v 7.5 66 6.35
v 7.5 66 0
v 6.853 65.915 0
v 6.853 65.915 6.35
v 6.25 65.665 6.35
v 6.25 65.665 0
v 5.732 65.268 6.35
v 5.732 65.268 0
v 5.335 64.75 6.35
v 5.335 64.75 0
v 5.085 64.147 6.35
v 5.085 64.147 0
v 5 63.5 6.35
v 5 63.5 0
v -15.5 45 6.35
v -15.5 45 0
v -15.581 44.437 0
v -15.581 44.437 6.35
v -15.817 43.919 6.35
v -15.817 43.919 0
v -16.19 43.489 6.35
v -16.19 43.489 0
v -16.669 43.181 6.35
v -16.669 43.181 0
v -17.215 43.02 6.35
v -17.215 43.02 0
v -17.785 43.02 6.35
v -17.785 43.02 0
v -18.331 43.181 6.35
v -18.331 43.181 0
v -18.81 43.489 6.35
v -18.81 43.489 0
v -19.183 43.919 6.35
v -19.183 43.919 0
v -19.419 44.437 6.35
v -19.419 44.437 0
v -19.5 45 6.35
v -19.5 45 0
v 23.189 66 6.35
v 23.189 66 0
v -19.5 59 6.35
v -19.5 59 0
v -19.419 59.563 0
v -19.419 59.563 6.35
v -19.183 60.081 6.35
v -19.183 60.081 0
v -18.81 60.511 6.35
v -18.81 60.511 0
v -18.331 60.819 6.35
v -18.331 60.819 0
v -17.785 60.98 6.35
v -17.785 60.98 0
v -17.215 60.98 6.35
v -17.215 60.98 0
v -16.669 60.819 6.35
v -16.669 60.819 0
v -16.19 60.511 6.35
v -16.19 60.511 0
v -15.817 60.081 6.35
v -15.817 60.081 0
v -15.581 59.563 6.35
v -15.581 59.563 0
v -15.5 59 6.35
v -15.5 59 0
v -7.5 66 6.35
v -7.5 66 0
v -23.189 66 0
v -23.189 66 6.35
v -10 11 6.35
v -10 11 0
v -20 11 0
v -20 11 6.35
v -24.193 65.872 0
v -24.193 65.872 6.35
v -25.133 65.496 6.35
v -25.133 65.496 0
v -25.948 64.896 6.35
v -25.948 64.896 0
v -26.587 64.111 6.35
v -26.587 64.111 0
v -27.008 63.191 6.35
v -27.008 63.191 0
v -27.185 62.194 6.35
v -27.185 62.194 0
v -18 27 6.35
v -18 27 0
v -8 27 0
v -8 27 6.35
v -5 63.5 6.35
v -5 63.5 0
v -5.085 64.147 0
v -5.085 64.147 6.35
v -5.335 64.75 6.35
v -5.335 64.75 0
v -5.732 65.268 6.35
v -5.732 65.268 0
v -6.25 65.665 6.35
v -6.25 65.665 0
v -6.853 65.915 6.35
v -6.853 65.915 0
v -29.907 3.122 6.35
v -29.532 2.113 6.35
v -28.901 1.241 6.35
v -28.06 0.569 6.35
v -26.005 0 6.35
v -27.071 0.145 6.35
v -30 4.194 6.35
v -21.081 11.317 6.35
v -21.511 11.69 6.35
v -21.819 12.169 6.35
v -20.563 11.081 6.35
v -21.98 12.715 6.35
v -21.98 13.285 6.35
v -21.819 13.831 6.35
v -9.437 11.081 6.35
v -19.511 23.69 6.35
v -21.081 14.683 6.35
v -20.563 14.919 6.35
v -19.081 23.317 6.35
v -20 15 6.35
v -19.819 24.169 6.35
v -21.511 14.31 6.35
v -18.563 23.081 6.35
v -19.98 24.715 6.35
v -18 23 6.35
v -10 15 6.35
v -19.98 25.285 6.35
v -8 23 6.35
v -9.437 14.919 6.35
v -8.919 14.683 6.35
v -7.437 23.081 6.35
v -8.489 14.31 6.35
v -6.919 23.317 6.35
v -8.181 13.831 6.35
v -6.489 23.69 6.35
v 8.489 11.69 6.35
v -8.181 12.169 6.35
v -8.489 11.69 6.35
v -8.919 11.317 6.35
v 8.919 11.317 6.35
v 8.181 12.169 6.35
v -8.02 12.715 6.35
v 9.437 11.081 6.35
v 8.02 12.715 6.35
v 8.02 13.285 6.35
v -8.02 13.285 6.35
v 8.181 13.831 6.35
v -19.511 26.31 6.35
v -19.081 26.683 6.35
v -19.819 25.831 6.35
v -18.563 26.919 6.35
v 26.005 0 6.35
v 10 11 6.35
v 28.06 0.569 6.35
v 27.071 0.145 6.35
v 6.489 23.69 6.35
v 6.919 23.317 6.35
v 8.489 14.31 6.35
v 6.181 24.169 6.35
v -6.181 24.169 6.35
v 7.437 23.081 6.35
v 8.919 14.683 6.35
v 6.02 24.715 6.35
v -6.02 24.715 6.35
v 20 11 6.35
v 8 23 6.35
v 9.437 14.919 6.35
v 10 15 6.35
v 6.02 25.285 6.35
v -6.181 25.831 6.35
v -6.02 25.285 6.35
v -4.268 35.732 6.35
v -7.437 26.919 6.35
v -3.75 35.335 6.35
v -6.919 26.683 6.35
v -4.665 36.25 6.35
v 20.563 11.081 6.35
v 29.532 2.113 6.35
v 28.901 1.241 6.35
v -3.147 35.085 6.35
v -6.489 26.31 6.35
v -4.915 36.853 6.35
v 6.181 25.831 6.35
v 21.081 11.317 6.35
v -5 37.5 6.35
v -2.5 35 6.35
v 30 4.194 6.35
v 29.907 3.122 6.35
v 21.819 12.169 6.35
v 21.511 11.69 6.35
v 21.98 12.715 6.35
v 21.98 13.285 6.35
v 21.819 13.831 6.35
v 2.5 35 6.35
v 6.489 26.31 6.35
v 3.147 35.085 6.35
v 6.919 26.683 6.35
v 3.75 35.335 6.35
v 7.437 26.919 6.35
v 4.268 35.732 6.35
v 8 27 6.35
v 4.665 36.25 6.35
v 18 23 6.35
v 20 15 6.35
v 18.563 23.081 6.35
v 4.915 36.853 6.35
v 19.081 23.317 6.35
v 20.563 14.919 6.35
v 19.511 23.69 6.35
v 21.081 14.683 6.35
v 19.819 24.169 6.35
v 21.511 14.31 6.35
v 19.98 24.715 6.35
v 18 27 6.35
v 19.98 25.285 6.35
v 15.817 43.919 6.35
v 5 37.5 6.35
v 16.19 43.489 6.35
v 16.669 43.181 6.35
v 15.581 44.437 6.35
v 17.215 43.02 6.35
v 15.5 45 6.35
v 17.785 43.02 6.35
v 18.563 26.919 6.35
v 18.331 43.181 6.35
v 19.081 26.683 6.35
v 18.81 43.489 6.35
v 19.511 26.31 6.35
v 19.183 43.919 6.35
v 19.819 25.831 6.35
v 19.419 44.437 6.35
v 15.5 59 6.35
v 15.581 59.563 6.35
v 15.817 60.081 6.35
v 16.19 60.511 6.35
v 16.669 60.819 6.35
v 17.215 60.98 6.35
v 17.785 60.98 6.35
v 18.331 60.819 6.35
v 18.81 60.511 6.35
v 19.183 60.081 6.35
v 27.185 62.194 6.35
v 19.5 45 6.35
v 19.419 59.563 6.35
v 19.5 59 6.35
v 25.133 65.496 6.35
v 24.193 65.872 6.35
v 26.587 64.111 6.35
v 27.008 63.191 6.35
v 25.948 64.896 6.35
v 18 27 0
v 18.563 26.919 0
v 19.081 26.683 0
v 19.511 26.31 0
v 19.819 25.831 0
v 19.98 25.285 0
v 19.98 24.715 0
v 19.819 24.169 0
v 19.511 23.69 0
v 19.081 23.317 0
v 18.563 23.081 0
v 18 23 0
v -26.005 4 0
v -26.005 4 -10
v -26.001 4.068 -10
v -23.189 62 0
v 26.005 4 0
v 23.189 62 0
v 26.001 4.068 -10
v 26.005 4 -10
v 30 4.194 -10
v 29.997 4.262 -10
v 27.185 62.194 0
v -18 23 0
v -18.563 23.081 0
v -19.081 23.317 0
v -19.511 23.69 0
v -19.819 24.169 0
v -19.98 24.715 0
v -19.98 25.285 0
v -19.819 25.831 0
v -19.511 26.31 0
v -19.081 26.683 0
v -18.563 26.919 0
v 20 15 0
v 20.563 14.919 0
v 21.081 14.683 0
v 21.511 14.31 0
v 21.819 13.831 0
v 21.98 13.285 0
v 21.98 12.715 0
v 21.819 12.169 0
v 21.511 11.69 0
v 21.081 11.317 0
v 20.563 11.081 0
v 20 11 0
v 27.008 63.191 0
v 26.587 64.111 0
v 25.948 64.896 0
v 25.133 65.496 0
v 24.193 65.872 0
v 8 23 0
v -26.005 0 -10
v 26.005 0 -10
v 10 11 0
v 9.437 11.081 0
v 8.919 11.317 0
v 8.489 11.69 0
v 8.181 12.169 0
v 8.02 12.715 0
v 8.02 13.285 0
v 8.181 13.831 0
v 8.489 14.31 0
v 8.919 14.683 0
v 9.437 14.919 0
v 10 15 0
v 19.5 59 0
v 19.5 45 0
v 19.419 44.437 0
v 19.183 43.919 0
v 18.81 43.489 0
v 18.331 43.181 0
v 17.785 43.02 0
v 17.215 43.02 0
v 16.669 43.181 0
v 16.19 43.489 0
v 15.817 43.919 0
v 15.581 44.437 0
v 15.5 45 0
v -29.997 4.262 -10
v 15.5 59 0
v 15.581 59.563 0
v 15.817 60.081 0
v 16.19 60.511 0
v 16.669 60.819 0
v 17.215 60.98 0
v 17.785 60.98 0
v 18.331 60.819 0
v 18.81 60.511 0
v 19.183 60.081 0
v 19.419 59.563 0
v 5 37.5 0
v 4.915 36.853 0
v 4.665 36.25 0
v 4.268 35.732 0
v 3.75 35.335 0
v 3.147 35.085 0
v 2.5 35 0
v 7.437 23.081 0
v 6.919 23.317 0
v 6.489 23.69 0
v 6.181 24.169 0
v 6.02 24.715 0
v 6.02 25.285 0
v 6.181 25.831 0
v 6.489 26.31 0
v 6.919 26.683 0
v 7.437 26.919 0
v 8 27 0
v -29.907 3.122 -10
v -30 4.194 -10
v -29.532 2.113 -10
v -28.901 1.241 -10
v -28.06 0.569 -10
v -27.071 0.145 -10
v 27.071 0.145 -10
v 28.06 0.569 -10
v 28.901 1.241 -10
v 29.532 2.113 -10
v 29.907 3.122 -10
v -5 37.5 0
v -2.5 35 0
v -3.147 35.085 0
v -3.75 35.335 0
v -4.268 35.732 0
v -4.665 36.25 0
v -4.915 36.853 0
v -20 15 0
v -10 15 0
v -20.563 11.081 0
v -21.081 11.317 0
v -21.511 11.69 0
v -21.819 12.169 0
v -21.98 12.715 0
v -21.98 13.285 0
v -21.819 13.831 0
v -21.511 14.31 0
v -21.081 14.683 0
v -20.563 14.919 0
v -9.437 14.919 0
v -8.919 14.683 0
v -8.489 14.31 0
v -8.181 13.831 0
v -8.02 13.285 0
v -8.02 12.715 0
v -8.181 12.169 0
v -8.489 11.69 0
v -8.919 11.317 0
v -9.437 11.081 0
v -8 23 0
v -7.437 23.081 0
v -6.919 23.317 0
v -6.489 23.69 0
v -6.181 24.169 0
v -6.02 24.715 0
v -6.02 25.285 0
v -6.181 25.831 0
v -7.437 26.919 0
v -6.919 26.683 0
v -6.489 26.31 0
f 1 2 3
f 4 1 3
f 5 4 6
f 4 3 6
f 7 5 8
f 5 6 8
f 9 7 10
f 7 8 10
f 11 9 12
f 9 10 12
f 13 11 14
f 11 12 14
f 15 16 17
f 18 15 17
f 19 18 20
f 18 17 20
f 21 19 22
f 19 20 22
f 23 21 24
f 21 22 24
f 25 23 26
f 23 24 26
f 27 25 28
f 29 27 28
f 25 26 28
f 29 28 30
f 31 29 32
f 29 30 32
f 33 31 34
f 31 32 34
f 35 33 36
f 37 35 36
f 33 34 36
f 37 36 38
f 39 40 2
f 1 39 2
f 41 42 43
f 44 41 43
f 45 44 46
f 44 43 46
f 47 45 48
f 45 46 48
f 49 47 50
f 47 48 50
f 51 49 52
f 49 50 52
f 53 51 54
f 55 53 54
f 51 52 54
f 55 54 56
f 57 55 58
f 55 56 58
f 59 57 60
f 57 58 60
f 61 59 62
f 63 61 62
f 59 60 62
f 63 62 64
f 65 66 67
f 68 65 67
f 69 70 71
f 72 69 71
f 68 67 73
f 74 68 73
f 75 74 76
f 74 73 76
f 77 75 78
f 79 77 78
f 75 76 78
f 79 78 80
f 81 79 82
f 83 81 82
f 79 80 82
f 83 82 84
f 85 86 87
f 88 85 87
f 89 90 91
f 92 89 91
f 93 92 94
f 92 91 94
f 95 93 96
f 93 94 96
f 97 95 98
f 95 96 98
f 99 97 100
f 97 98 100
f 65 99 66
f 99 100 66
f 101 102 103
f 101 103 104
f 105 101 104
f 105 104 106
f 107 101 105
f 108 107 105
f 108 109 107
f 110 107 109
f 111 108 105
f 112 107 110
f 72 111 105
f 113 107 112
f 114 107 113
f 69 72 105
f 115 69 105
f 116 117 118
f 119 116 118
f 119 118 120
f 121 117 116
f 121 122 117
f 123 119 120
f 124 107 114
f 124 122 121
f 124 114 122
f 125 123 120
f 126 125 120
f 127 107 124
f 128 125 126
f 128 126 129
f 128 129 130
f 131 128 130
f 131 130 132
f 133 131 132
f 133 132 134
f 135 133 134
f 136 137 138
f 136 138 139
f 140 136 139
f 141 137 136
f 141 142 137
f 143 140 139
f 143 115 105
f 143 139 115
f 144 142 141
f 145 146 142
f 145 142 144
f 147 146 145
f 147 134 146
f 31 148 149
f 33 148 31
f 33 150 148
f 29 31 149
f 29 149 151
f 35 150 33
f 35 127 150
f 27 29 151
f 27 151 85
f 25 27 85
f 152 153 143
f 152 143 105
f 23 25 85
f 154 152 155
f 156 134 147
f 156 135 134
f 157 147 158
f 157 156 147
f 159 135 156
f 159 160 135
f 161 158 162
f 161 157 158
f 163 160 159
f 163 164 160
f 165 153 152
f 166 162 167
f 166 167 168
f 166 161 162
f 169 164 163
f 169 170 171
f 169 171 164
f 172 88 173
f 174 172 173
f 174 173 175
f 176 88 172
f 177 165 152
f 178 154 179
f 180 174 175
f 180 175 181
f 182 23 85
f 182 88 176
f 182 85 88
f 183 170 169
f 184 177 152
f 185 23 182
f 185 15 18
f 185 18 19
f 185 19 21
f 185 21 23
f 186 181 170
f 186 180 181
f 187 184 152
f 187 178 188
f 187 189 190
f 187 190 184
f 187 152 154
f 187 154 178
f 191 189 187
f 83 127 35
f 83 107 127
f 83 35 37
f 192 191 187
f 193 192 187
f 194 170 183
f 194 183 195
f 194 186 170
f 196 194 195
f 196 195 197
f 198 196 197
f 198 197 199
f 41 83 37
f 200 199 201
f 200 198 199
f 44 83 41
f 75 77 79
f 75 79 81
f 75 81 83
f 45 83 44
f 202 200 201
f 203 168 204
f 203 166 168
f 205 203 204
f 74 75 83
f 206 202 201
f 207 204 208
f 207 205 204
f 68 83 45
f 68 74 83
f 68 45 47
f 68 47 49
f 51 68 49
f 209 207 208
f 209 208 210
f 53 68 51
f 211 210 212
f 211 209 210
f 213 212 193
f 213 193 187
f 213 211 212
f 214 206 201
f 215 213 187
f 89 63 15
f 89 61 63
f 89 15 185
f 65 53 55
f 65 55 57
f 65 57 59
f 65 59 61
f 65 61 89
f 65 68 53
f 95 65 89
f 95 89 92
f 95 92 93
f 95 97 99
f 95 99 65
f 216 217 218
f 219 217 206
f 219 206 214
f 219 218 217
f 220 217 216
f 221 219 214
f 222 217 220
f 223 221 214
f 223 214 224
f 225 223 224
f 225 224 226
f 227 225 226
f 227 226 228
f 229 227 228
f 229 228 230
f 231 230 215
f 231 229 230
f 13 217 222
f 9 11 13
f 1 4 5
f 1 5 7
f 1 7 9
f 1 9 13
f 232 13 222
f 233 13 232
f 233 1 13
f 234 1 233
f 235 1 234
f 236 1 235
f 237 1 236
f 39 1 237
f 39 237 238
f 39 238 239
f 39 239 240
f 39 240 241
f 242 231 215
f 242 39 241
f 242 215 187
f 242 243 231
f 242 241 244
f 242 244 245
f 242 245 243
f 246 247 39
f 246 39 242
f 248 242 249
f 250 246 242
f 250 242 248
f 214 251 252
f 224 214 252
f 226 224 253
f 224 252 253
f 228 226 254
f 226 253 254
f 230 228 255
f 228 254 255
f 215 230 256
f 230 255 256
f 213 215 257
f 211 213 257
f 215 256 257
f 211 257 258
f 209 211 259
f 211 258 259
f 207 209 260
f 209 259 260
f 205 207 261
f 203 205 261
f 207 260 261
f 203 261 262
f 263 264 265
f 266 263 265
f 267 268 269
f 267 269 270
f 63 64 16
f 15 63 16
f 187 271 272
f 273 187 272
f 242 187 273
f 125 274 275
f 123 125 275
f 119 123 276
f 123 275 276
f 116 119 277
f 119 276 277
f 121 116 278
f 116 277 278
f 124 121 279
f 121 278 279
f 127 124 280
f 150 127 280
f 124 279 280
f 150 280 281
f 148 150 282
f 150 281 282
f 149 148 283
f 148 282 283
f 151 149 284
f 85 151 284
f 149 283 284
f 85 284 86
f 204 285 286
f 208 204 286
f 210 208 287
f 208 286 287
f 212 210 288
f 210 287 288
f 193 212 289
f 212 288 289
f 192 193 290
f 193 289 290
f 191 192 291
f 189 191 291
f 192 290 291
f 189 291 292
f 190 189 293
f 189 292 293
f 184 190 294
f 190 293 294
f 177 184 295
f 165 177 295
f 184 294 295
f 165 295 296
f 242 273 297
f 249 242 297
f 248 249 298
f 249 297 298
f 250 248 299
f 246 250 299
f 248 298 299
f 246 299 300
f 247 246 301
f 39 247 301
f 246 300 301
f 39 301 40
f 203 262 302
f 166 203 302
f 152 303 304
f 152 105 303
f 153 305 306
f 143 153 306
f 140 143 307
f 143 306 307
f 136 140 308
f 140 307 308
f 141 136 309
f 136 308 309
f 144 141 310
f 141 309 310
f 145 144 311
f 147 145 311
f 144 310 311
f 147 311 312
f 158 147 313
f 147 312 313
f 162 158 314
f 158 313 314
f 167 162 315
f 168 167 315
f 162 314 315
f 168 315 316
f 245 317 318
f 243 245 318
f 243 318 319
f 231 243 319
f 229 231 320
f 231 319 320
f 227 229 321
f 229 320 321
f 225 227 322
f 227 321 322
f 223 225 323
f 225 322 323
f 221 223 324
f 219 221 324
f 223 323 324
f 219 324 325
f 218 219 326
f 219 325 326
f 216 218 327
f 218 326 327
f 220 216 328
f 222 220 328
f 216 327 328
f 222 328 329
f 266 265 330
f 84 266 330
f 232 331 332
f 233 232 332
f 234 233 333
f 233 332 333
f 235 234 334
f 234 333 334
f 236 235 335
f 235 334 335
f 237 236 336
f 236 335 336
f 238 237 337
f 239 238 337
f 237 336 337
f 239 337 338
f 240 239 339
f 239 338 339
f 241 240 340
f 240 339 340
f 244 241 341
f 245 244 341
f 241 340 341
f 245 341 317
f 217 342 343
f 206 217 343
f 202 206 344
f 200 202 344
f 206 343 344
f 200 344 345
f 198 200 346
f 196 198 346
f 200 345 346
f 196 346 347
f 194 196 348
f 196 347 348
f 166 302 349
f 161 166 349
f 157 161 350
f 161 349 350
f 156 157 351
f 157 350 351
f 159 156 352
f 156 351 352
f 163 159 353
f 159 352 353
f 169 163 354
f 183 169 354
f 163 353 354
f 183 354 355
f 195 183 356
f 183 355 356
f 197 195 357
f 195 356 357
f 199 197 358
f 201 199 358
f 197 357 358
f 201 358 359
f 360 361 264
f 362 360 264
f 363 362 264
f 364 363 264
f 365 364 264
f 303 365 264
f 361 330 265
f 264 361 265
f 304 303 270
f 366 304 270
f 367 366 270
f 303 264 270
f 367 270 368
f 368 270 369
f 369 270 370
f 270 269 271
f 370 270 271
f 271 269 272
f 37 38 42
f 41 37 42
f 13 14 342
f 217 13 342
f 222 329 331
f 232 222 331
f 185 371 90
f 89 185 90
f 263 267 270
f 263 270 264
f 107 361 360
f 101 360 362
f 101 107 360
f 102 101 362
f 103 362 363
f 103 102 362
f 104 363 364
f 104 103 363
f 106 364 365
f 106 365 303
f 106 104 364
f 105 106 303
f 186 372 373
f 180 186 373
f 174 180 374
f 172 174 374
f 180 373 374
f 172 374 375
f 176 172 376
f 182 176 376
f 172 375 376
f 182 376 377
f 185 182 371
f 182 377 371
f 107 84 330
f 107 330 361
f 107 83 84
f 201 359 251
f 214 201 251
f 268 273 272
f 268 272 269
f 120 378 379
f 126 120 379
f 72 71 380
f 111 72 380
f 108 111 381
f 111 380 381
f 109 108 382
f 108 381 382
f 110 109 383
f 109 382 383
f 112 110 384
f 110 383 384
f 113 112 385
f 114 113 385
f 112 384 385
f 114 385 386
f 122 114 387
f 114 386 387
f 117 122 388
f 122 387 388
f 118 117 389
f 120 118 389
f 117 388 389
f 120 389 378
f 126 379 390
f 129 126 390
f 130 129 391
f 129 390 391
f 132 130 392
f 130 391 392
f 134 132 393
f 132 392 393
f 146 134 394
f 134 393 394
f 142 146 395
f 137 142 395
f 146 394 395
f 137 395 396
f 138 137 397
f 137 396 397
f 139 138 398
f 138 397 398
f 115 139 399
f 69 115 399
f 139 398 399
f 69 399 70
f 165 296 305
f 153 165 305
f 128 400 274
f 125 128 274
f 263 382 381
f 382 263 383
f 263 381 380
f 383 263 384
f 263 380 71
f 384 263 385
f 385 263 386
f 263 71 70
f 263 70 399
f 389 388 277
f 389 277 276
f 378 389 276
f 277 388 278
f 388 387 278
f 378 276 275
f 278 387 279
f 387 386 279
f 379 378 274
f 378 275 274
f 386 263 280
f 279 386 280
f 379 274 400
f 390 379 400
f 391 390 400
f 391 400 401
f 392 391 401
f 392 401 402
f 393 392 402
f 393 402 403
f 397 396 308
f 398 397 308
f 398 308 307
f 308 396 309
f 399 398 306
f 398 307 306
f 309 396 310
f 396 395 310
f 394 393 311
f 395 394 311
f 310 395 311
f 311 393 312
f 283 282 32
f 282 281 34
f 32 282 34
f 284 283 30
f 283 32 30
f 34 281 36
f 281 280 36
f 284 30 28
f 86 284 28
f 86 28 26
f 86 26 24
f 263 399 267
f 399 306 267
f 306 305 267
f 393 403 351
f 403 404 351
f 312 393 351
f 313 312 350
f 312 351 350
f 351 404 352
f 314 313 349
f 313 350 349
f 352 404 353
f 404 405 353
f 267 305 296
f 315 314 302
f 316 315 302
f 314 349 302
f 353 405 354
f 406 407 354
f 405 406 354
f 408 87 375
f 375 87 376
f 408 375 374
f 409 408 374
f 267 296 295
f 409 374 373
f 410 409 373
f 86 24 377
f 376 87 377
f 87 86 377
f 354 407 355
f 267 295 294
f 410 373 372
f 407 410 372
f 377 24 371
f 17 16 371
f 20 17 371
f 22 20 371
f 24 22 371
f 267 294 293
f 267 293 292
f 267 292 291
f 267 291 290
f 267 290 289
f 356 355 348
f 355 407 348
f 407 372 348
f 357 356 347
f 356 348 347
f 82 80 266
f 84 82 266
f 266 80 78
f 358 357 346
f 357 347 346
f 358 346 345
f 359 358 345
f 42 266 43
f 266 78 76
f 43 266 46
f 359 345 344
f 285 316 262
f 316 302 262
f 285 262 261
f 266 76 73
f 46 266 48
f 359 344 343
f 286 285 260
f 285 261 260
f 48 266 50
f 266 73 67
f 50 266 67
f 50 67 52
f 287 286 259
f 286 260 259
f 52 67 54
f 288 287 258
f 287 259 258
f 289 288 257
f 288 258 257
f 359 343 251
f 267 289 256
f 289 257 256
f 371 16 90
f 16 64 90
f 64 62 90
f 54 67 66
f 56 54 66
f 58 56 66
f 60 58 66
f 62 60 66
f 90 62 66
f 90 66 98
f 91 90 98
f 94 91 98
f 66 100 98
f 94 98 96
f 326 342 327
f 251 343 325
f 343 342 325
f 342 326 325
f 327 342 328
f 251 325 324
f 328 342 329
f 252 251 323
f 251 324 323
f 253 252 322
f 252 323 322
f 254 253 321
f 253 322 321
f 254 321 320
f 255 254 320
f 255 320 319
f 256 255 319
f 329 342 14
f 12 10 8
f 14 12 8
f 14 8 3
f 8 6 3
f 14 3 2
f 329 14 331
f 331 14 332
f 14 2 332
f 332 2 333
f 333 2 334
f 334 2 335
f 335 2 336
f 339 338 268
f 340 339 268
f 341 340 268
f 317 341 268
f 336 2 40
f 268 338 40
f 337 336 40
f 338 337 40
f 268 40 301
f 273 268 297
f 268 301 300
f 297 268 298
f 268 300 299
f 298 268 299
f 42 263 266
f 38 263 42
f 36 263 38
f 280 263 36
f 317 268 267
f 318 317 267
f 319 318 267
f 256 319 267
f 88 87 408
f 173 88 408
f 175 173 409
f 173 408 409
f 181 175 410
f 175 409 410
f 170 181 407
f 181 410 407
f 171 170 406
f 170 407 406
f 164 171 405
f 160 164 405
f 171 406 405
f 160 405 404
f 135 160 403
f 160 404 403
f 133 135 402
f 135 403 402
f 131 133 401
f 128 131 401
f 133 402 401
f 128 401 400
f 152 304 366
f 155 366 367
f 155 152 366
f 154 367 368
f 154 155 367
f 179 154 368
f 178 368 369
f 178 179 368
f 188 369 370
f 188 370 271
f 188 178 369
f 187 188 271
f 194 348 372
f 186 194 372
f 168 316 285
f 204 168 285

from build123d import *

# Parameters (mm, degrees)
F1_DEPTH = 6.35
F3_DEPTH = 10
F4_SIZE2 = 9.99999
F4_SIZE  = 57.99999
F5_SIZE2 = 9.99999
F5_SIZE  = 57.99999


# Not quite as in the source:
# - a fillet or chamfer is up to 0.001 mm smaller than in the source, because OpenCascade refuses the exact size


with BuildPart() as f1:
    # F0 (on Top) → F1 (new body)
    with BuildSketch(Plane.XY):
        with BuildLine():
            Line((-26.0047037435, 0), (0, 0))
            Line((0, 0), (26.0047037435, 0))
            ThreePointArc((26.0047037435, 0), (28.9008830765, 1.2409883525), (30, 4.1939273644))
            Line((30, 4.1939273644), (27.1847426542, 62.1939273644))
            ThreePointArc((27.1847426542, 62.1939273644), (25.9484580453, 64.896179333), (23.1894463977, 66))
            Line((23.1894463977, 66), (7.5, 66))
            ThreePointArc((7.5, 66), (5.732233047, 65.267766953), (5, 63.5))
            Line((5, 63.5), (5, 37.5))
            ThreePointArc((5, 37.5), (4.267766953, 35.732233047), (2.5, 35))
            Line((2.5, 35), (0, 35))
            Line((0, 35), (-2.5, 35))
            ThreePointArc((-2.5, 35), (-4.267766953, 35.732233047), (-5, 37.5))
            Line((-5, 37.5), (-5, 63.5))
            ThreePointArc((-5, 63.5), (-5.732233047, 65.267766953), (-7.5, 66))
            Line((-7.5, 66), (-23.1894463977, 66))
            ThreePointArc((-23.1894463977, 66), (-25.9484580453, 64.896179333), (-27.1847426542, 62.1939273644))
            Line((-27.1847426542, 62.1939273644), (-30, 4.1939273644))
            ThreePointArc((-30, 4.1939273644), (-28.9008830765, 1.2409883525), (-26.0047037435, 0))
        make_face()
        with BuildLine():
            ThreePointArc((-20, 11), (-22, 13), (-20, 15))
            Line((-20, 15), (-10, 15))
            ThreePointArc((-10, 15), (-8, 13), (-10, 11))
            Line((-10, 11), (-20, 11))
        make_face(mode=Mode.SUBTRACT)
        with BuildLine():
            Line((-18, 27), (-8, 27))
            ThreePointArc((-8, 27), (-6, 25), (-8, 23))
            Line((-8, 23), (-18, 23))
            ThreePointArc((-18, 23), (-20, 25), (-18, 27))
        make_face(mode=Mode.SUBTRACT)
        with BuildLine():
            Line((10, 15), (20, 15))
            ThreePointArc((20, 15), (22, 13), (20, 11))
            Line((20, 11), (10, 11))
            ThreePointArc((10, 11), (8, 13), (10, 15))
        make_face(mode=Mode.SUBTRACT)
        with BuildLine():
            Line((18, 23), (8, 23))
            ThreePointArc((8, 23), (6, 25), (8, 27))
            Line((8, 27), (18, 27))
            ThreePointArc((18, 27), (20, 25), (18, 23))
        make_face(mode=Mode.SUBTRACT)
        with BuildLine():
            ThreePointArc((-15.5, 45), (-17.5, 43), (-19.5, 45))
            Line((-19.5, 45), (-19.5, 59))
            ThreePointArc((-19.5, 59), (-17.5, 61), (-15.5, 59))
            Line((-15.5, 59), (-15.5, 45))
        make_face(mode=Mode.SUBTRACT)
        with BuildLine():
            Line((15.5, 45), (15.5, 59))
            ThreePointArc((15.5, 59), (17.5, 61), (19.5, 59))
            Line((19.5, 59), (19.5, 45))
            ThreePointArc((19.5, 45), (17.5, 43), (15.5, 45))
        make_face(mode=Mode.SUBTRACT)
    extrude(amount=F1_DEPTH)

    # F2 (on face) → F3 (join)
    with BuildSketch(Plane.XY):
        with BuildLine():
            ThreePointArc((26.0047037435, 0), (28.9008830765, 1.2409883525), (30, 4.1939273644))
            Line((30, 4.1939273644), (26.0047037435, 4))
            Line((26.0047037435, 4), (-26.0047037435, 4))
            Line((-26.0047037435, 4), (-30, 4.1939273644))
            ThreePointArc((-30, 4.1939273644), (-28.9008830765, 1.2409883525), (-26.0047037435, 0))
            Line((-26.0047037435, 0), (0, 0))
            Line((0, 0), (26.0047037435, 0))
        make_face()
        Polygon((-30, 4.1939273644), (-26.0047037435, 4), (-23.1894463977, 62), (-27.1847426542, 62.1939273644), align=None)
        Polygon((26.0047037435, 4), (30, 4.1939273644), (27.1847426542, 62.1939273644), (23.1894463977, 62), align=None)
    extrude(amount=-F3_DEPTH)

    # F4 (size 58 and 10 in the source; OpenCascade refuses exactly that, so slightly less here)
    f4_edges = [f1.edges().sort_by_distance(p)[0] for p in [
        (-25.187095, 62.096964, -10),
    ]]
    f4_side = f1.faces().sort_by_distance((0, 0.864246, -10))[0]
    chamfer(f4_edges, length=F4_SIZE, length2=F4_SIZE2, reference=f4_side)

    # F5 (size 58 and 10 in the source; OpenCascade refuses exactly that, so slightly less here)
    f5_edges = [f1.edges().sort_by_distance(p)[0] for p in [
        (25.187095, 62.096964, -10),
    ]]
    f5_side = f1.faces().sort_by_distance((-25.139818, 3.992207, -10))[0]
    chamfer(f5_edges, length=F5_SIZE, length2=F5_SIZE2, reference=f5_side)


solid = f1.part
